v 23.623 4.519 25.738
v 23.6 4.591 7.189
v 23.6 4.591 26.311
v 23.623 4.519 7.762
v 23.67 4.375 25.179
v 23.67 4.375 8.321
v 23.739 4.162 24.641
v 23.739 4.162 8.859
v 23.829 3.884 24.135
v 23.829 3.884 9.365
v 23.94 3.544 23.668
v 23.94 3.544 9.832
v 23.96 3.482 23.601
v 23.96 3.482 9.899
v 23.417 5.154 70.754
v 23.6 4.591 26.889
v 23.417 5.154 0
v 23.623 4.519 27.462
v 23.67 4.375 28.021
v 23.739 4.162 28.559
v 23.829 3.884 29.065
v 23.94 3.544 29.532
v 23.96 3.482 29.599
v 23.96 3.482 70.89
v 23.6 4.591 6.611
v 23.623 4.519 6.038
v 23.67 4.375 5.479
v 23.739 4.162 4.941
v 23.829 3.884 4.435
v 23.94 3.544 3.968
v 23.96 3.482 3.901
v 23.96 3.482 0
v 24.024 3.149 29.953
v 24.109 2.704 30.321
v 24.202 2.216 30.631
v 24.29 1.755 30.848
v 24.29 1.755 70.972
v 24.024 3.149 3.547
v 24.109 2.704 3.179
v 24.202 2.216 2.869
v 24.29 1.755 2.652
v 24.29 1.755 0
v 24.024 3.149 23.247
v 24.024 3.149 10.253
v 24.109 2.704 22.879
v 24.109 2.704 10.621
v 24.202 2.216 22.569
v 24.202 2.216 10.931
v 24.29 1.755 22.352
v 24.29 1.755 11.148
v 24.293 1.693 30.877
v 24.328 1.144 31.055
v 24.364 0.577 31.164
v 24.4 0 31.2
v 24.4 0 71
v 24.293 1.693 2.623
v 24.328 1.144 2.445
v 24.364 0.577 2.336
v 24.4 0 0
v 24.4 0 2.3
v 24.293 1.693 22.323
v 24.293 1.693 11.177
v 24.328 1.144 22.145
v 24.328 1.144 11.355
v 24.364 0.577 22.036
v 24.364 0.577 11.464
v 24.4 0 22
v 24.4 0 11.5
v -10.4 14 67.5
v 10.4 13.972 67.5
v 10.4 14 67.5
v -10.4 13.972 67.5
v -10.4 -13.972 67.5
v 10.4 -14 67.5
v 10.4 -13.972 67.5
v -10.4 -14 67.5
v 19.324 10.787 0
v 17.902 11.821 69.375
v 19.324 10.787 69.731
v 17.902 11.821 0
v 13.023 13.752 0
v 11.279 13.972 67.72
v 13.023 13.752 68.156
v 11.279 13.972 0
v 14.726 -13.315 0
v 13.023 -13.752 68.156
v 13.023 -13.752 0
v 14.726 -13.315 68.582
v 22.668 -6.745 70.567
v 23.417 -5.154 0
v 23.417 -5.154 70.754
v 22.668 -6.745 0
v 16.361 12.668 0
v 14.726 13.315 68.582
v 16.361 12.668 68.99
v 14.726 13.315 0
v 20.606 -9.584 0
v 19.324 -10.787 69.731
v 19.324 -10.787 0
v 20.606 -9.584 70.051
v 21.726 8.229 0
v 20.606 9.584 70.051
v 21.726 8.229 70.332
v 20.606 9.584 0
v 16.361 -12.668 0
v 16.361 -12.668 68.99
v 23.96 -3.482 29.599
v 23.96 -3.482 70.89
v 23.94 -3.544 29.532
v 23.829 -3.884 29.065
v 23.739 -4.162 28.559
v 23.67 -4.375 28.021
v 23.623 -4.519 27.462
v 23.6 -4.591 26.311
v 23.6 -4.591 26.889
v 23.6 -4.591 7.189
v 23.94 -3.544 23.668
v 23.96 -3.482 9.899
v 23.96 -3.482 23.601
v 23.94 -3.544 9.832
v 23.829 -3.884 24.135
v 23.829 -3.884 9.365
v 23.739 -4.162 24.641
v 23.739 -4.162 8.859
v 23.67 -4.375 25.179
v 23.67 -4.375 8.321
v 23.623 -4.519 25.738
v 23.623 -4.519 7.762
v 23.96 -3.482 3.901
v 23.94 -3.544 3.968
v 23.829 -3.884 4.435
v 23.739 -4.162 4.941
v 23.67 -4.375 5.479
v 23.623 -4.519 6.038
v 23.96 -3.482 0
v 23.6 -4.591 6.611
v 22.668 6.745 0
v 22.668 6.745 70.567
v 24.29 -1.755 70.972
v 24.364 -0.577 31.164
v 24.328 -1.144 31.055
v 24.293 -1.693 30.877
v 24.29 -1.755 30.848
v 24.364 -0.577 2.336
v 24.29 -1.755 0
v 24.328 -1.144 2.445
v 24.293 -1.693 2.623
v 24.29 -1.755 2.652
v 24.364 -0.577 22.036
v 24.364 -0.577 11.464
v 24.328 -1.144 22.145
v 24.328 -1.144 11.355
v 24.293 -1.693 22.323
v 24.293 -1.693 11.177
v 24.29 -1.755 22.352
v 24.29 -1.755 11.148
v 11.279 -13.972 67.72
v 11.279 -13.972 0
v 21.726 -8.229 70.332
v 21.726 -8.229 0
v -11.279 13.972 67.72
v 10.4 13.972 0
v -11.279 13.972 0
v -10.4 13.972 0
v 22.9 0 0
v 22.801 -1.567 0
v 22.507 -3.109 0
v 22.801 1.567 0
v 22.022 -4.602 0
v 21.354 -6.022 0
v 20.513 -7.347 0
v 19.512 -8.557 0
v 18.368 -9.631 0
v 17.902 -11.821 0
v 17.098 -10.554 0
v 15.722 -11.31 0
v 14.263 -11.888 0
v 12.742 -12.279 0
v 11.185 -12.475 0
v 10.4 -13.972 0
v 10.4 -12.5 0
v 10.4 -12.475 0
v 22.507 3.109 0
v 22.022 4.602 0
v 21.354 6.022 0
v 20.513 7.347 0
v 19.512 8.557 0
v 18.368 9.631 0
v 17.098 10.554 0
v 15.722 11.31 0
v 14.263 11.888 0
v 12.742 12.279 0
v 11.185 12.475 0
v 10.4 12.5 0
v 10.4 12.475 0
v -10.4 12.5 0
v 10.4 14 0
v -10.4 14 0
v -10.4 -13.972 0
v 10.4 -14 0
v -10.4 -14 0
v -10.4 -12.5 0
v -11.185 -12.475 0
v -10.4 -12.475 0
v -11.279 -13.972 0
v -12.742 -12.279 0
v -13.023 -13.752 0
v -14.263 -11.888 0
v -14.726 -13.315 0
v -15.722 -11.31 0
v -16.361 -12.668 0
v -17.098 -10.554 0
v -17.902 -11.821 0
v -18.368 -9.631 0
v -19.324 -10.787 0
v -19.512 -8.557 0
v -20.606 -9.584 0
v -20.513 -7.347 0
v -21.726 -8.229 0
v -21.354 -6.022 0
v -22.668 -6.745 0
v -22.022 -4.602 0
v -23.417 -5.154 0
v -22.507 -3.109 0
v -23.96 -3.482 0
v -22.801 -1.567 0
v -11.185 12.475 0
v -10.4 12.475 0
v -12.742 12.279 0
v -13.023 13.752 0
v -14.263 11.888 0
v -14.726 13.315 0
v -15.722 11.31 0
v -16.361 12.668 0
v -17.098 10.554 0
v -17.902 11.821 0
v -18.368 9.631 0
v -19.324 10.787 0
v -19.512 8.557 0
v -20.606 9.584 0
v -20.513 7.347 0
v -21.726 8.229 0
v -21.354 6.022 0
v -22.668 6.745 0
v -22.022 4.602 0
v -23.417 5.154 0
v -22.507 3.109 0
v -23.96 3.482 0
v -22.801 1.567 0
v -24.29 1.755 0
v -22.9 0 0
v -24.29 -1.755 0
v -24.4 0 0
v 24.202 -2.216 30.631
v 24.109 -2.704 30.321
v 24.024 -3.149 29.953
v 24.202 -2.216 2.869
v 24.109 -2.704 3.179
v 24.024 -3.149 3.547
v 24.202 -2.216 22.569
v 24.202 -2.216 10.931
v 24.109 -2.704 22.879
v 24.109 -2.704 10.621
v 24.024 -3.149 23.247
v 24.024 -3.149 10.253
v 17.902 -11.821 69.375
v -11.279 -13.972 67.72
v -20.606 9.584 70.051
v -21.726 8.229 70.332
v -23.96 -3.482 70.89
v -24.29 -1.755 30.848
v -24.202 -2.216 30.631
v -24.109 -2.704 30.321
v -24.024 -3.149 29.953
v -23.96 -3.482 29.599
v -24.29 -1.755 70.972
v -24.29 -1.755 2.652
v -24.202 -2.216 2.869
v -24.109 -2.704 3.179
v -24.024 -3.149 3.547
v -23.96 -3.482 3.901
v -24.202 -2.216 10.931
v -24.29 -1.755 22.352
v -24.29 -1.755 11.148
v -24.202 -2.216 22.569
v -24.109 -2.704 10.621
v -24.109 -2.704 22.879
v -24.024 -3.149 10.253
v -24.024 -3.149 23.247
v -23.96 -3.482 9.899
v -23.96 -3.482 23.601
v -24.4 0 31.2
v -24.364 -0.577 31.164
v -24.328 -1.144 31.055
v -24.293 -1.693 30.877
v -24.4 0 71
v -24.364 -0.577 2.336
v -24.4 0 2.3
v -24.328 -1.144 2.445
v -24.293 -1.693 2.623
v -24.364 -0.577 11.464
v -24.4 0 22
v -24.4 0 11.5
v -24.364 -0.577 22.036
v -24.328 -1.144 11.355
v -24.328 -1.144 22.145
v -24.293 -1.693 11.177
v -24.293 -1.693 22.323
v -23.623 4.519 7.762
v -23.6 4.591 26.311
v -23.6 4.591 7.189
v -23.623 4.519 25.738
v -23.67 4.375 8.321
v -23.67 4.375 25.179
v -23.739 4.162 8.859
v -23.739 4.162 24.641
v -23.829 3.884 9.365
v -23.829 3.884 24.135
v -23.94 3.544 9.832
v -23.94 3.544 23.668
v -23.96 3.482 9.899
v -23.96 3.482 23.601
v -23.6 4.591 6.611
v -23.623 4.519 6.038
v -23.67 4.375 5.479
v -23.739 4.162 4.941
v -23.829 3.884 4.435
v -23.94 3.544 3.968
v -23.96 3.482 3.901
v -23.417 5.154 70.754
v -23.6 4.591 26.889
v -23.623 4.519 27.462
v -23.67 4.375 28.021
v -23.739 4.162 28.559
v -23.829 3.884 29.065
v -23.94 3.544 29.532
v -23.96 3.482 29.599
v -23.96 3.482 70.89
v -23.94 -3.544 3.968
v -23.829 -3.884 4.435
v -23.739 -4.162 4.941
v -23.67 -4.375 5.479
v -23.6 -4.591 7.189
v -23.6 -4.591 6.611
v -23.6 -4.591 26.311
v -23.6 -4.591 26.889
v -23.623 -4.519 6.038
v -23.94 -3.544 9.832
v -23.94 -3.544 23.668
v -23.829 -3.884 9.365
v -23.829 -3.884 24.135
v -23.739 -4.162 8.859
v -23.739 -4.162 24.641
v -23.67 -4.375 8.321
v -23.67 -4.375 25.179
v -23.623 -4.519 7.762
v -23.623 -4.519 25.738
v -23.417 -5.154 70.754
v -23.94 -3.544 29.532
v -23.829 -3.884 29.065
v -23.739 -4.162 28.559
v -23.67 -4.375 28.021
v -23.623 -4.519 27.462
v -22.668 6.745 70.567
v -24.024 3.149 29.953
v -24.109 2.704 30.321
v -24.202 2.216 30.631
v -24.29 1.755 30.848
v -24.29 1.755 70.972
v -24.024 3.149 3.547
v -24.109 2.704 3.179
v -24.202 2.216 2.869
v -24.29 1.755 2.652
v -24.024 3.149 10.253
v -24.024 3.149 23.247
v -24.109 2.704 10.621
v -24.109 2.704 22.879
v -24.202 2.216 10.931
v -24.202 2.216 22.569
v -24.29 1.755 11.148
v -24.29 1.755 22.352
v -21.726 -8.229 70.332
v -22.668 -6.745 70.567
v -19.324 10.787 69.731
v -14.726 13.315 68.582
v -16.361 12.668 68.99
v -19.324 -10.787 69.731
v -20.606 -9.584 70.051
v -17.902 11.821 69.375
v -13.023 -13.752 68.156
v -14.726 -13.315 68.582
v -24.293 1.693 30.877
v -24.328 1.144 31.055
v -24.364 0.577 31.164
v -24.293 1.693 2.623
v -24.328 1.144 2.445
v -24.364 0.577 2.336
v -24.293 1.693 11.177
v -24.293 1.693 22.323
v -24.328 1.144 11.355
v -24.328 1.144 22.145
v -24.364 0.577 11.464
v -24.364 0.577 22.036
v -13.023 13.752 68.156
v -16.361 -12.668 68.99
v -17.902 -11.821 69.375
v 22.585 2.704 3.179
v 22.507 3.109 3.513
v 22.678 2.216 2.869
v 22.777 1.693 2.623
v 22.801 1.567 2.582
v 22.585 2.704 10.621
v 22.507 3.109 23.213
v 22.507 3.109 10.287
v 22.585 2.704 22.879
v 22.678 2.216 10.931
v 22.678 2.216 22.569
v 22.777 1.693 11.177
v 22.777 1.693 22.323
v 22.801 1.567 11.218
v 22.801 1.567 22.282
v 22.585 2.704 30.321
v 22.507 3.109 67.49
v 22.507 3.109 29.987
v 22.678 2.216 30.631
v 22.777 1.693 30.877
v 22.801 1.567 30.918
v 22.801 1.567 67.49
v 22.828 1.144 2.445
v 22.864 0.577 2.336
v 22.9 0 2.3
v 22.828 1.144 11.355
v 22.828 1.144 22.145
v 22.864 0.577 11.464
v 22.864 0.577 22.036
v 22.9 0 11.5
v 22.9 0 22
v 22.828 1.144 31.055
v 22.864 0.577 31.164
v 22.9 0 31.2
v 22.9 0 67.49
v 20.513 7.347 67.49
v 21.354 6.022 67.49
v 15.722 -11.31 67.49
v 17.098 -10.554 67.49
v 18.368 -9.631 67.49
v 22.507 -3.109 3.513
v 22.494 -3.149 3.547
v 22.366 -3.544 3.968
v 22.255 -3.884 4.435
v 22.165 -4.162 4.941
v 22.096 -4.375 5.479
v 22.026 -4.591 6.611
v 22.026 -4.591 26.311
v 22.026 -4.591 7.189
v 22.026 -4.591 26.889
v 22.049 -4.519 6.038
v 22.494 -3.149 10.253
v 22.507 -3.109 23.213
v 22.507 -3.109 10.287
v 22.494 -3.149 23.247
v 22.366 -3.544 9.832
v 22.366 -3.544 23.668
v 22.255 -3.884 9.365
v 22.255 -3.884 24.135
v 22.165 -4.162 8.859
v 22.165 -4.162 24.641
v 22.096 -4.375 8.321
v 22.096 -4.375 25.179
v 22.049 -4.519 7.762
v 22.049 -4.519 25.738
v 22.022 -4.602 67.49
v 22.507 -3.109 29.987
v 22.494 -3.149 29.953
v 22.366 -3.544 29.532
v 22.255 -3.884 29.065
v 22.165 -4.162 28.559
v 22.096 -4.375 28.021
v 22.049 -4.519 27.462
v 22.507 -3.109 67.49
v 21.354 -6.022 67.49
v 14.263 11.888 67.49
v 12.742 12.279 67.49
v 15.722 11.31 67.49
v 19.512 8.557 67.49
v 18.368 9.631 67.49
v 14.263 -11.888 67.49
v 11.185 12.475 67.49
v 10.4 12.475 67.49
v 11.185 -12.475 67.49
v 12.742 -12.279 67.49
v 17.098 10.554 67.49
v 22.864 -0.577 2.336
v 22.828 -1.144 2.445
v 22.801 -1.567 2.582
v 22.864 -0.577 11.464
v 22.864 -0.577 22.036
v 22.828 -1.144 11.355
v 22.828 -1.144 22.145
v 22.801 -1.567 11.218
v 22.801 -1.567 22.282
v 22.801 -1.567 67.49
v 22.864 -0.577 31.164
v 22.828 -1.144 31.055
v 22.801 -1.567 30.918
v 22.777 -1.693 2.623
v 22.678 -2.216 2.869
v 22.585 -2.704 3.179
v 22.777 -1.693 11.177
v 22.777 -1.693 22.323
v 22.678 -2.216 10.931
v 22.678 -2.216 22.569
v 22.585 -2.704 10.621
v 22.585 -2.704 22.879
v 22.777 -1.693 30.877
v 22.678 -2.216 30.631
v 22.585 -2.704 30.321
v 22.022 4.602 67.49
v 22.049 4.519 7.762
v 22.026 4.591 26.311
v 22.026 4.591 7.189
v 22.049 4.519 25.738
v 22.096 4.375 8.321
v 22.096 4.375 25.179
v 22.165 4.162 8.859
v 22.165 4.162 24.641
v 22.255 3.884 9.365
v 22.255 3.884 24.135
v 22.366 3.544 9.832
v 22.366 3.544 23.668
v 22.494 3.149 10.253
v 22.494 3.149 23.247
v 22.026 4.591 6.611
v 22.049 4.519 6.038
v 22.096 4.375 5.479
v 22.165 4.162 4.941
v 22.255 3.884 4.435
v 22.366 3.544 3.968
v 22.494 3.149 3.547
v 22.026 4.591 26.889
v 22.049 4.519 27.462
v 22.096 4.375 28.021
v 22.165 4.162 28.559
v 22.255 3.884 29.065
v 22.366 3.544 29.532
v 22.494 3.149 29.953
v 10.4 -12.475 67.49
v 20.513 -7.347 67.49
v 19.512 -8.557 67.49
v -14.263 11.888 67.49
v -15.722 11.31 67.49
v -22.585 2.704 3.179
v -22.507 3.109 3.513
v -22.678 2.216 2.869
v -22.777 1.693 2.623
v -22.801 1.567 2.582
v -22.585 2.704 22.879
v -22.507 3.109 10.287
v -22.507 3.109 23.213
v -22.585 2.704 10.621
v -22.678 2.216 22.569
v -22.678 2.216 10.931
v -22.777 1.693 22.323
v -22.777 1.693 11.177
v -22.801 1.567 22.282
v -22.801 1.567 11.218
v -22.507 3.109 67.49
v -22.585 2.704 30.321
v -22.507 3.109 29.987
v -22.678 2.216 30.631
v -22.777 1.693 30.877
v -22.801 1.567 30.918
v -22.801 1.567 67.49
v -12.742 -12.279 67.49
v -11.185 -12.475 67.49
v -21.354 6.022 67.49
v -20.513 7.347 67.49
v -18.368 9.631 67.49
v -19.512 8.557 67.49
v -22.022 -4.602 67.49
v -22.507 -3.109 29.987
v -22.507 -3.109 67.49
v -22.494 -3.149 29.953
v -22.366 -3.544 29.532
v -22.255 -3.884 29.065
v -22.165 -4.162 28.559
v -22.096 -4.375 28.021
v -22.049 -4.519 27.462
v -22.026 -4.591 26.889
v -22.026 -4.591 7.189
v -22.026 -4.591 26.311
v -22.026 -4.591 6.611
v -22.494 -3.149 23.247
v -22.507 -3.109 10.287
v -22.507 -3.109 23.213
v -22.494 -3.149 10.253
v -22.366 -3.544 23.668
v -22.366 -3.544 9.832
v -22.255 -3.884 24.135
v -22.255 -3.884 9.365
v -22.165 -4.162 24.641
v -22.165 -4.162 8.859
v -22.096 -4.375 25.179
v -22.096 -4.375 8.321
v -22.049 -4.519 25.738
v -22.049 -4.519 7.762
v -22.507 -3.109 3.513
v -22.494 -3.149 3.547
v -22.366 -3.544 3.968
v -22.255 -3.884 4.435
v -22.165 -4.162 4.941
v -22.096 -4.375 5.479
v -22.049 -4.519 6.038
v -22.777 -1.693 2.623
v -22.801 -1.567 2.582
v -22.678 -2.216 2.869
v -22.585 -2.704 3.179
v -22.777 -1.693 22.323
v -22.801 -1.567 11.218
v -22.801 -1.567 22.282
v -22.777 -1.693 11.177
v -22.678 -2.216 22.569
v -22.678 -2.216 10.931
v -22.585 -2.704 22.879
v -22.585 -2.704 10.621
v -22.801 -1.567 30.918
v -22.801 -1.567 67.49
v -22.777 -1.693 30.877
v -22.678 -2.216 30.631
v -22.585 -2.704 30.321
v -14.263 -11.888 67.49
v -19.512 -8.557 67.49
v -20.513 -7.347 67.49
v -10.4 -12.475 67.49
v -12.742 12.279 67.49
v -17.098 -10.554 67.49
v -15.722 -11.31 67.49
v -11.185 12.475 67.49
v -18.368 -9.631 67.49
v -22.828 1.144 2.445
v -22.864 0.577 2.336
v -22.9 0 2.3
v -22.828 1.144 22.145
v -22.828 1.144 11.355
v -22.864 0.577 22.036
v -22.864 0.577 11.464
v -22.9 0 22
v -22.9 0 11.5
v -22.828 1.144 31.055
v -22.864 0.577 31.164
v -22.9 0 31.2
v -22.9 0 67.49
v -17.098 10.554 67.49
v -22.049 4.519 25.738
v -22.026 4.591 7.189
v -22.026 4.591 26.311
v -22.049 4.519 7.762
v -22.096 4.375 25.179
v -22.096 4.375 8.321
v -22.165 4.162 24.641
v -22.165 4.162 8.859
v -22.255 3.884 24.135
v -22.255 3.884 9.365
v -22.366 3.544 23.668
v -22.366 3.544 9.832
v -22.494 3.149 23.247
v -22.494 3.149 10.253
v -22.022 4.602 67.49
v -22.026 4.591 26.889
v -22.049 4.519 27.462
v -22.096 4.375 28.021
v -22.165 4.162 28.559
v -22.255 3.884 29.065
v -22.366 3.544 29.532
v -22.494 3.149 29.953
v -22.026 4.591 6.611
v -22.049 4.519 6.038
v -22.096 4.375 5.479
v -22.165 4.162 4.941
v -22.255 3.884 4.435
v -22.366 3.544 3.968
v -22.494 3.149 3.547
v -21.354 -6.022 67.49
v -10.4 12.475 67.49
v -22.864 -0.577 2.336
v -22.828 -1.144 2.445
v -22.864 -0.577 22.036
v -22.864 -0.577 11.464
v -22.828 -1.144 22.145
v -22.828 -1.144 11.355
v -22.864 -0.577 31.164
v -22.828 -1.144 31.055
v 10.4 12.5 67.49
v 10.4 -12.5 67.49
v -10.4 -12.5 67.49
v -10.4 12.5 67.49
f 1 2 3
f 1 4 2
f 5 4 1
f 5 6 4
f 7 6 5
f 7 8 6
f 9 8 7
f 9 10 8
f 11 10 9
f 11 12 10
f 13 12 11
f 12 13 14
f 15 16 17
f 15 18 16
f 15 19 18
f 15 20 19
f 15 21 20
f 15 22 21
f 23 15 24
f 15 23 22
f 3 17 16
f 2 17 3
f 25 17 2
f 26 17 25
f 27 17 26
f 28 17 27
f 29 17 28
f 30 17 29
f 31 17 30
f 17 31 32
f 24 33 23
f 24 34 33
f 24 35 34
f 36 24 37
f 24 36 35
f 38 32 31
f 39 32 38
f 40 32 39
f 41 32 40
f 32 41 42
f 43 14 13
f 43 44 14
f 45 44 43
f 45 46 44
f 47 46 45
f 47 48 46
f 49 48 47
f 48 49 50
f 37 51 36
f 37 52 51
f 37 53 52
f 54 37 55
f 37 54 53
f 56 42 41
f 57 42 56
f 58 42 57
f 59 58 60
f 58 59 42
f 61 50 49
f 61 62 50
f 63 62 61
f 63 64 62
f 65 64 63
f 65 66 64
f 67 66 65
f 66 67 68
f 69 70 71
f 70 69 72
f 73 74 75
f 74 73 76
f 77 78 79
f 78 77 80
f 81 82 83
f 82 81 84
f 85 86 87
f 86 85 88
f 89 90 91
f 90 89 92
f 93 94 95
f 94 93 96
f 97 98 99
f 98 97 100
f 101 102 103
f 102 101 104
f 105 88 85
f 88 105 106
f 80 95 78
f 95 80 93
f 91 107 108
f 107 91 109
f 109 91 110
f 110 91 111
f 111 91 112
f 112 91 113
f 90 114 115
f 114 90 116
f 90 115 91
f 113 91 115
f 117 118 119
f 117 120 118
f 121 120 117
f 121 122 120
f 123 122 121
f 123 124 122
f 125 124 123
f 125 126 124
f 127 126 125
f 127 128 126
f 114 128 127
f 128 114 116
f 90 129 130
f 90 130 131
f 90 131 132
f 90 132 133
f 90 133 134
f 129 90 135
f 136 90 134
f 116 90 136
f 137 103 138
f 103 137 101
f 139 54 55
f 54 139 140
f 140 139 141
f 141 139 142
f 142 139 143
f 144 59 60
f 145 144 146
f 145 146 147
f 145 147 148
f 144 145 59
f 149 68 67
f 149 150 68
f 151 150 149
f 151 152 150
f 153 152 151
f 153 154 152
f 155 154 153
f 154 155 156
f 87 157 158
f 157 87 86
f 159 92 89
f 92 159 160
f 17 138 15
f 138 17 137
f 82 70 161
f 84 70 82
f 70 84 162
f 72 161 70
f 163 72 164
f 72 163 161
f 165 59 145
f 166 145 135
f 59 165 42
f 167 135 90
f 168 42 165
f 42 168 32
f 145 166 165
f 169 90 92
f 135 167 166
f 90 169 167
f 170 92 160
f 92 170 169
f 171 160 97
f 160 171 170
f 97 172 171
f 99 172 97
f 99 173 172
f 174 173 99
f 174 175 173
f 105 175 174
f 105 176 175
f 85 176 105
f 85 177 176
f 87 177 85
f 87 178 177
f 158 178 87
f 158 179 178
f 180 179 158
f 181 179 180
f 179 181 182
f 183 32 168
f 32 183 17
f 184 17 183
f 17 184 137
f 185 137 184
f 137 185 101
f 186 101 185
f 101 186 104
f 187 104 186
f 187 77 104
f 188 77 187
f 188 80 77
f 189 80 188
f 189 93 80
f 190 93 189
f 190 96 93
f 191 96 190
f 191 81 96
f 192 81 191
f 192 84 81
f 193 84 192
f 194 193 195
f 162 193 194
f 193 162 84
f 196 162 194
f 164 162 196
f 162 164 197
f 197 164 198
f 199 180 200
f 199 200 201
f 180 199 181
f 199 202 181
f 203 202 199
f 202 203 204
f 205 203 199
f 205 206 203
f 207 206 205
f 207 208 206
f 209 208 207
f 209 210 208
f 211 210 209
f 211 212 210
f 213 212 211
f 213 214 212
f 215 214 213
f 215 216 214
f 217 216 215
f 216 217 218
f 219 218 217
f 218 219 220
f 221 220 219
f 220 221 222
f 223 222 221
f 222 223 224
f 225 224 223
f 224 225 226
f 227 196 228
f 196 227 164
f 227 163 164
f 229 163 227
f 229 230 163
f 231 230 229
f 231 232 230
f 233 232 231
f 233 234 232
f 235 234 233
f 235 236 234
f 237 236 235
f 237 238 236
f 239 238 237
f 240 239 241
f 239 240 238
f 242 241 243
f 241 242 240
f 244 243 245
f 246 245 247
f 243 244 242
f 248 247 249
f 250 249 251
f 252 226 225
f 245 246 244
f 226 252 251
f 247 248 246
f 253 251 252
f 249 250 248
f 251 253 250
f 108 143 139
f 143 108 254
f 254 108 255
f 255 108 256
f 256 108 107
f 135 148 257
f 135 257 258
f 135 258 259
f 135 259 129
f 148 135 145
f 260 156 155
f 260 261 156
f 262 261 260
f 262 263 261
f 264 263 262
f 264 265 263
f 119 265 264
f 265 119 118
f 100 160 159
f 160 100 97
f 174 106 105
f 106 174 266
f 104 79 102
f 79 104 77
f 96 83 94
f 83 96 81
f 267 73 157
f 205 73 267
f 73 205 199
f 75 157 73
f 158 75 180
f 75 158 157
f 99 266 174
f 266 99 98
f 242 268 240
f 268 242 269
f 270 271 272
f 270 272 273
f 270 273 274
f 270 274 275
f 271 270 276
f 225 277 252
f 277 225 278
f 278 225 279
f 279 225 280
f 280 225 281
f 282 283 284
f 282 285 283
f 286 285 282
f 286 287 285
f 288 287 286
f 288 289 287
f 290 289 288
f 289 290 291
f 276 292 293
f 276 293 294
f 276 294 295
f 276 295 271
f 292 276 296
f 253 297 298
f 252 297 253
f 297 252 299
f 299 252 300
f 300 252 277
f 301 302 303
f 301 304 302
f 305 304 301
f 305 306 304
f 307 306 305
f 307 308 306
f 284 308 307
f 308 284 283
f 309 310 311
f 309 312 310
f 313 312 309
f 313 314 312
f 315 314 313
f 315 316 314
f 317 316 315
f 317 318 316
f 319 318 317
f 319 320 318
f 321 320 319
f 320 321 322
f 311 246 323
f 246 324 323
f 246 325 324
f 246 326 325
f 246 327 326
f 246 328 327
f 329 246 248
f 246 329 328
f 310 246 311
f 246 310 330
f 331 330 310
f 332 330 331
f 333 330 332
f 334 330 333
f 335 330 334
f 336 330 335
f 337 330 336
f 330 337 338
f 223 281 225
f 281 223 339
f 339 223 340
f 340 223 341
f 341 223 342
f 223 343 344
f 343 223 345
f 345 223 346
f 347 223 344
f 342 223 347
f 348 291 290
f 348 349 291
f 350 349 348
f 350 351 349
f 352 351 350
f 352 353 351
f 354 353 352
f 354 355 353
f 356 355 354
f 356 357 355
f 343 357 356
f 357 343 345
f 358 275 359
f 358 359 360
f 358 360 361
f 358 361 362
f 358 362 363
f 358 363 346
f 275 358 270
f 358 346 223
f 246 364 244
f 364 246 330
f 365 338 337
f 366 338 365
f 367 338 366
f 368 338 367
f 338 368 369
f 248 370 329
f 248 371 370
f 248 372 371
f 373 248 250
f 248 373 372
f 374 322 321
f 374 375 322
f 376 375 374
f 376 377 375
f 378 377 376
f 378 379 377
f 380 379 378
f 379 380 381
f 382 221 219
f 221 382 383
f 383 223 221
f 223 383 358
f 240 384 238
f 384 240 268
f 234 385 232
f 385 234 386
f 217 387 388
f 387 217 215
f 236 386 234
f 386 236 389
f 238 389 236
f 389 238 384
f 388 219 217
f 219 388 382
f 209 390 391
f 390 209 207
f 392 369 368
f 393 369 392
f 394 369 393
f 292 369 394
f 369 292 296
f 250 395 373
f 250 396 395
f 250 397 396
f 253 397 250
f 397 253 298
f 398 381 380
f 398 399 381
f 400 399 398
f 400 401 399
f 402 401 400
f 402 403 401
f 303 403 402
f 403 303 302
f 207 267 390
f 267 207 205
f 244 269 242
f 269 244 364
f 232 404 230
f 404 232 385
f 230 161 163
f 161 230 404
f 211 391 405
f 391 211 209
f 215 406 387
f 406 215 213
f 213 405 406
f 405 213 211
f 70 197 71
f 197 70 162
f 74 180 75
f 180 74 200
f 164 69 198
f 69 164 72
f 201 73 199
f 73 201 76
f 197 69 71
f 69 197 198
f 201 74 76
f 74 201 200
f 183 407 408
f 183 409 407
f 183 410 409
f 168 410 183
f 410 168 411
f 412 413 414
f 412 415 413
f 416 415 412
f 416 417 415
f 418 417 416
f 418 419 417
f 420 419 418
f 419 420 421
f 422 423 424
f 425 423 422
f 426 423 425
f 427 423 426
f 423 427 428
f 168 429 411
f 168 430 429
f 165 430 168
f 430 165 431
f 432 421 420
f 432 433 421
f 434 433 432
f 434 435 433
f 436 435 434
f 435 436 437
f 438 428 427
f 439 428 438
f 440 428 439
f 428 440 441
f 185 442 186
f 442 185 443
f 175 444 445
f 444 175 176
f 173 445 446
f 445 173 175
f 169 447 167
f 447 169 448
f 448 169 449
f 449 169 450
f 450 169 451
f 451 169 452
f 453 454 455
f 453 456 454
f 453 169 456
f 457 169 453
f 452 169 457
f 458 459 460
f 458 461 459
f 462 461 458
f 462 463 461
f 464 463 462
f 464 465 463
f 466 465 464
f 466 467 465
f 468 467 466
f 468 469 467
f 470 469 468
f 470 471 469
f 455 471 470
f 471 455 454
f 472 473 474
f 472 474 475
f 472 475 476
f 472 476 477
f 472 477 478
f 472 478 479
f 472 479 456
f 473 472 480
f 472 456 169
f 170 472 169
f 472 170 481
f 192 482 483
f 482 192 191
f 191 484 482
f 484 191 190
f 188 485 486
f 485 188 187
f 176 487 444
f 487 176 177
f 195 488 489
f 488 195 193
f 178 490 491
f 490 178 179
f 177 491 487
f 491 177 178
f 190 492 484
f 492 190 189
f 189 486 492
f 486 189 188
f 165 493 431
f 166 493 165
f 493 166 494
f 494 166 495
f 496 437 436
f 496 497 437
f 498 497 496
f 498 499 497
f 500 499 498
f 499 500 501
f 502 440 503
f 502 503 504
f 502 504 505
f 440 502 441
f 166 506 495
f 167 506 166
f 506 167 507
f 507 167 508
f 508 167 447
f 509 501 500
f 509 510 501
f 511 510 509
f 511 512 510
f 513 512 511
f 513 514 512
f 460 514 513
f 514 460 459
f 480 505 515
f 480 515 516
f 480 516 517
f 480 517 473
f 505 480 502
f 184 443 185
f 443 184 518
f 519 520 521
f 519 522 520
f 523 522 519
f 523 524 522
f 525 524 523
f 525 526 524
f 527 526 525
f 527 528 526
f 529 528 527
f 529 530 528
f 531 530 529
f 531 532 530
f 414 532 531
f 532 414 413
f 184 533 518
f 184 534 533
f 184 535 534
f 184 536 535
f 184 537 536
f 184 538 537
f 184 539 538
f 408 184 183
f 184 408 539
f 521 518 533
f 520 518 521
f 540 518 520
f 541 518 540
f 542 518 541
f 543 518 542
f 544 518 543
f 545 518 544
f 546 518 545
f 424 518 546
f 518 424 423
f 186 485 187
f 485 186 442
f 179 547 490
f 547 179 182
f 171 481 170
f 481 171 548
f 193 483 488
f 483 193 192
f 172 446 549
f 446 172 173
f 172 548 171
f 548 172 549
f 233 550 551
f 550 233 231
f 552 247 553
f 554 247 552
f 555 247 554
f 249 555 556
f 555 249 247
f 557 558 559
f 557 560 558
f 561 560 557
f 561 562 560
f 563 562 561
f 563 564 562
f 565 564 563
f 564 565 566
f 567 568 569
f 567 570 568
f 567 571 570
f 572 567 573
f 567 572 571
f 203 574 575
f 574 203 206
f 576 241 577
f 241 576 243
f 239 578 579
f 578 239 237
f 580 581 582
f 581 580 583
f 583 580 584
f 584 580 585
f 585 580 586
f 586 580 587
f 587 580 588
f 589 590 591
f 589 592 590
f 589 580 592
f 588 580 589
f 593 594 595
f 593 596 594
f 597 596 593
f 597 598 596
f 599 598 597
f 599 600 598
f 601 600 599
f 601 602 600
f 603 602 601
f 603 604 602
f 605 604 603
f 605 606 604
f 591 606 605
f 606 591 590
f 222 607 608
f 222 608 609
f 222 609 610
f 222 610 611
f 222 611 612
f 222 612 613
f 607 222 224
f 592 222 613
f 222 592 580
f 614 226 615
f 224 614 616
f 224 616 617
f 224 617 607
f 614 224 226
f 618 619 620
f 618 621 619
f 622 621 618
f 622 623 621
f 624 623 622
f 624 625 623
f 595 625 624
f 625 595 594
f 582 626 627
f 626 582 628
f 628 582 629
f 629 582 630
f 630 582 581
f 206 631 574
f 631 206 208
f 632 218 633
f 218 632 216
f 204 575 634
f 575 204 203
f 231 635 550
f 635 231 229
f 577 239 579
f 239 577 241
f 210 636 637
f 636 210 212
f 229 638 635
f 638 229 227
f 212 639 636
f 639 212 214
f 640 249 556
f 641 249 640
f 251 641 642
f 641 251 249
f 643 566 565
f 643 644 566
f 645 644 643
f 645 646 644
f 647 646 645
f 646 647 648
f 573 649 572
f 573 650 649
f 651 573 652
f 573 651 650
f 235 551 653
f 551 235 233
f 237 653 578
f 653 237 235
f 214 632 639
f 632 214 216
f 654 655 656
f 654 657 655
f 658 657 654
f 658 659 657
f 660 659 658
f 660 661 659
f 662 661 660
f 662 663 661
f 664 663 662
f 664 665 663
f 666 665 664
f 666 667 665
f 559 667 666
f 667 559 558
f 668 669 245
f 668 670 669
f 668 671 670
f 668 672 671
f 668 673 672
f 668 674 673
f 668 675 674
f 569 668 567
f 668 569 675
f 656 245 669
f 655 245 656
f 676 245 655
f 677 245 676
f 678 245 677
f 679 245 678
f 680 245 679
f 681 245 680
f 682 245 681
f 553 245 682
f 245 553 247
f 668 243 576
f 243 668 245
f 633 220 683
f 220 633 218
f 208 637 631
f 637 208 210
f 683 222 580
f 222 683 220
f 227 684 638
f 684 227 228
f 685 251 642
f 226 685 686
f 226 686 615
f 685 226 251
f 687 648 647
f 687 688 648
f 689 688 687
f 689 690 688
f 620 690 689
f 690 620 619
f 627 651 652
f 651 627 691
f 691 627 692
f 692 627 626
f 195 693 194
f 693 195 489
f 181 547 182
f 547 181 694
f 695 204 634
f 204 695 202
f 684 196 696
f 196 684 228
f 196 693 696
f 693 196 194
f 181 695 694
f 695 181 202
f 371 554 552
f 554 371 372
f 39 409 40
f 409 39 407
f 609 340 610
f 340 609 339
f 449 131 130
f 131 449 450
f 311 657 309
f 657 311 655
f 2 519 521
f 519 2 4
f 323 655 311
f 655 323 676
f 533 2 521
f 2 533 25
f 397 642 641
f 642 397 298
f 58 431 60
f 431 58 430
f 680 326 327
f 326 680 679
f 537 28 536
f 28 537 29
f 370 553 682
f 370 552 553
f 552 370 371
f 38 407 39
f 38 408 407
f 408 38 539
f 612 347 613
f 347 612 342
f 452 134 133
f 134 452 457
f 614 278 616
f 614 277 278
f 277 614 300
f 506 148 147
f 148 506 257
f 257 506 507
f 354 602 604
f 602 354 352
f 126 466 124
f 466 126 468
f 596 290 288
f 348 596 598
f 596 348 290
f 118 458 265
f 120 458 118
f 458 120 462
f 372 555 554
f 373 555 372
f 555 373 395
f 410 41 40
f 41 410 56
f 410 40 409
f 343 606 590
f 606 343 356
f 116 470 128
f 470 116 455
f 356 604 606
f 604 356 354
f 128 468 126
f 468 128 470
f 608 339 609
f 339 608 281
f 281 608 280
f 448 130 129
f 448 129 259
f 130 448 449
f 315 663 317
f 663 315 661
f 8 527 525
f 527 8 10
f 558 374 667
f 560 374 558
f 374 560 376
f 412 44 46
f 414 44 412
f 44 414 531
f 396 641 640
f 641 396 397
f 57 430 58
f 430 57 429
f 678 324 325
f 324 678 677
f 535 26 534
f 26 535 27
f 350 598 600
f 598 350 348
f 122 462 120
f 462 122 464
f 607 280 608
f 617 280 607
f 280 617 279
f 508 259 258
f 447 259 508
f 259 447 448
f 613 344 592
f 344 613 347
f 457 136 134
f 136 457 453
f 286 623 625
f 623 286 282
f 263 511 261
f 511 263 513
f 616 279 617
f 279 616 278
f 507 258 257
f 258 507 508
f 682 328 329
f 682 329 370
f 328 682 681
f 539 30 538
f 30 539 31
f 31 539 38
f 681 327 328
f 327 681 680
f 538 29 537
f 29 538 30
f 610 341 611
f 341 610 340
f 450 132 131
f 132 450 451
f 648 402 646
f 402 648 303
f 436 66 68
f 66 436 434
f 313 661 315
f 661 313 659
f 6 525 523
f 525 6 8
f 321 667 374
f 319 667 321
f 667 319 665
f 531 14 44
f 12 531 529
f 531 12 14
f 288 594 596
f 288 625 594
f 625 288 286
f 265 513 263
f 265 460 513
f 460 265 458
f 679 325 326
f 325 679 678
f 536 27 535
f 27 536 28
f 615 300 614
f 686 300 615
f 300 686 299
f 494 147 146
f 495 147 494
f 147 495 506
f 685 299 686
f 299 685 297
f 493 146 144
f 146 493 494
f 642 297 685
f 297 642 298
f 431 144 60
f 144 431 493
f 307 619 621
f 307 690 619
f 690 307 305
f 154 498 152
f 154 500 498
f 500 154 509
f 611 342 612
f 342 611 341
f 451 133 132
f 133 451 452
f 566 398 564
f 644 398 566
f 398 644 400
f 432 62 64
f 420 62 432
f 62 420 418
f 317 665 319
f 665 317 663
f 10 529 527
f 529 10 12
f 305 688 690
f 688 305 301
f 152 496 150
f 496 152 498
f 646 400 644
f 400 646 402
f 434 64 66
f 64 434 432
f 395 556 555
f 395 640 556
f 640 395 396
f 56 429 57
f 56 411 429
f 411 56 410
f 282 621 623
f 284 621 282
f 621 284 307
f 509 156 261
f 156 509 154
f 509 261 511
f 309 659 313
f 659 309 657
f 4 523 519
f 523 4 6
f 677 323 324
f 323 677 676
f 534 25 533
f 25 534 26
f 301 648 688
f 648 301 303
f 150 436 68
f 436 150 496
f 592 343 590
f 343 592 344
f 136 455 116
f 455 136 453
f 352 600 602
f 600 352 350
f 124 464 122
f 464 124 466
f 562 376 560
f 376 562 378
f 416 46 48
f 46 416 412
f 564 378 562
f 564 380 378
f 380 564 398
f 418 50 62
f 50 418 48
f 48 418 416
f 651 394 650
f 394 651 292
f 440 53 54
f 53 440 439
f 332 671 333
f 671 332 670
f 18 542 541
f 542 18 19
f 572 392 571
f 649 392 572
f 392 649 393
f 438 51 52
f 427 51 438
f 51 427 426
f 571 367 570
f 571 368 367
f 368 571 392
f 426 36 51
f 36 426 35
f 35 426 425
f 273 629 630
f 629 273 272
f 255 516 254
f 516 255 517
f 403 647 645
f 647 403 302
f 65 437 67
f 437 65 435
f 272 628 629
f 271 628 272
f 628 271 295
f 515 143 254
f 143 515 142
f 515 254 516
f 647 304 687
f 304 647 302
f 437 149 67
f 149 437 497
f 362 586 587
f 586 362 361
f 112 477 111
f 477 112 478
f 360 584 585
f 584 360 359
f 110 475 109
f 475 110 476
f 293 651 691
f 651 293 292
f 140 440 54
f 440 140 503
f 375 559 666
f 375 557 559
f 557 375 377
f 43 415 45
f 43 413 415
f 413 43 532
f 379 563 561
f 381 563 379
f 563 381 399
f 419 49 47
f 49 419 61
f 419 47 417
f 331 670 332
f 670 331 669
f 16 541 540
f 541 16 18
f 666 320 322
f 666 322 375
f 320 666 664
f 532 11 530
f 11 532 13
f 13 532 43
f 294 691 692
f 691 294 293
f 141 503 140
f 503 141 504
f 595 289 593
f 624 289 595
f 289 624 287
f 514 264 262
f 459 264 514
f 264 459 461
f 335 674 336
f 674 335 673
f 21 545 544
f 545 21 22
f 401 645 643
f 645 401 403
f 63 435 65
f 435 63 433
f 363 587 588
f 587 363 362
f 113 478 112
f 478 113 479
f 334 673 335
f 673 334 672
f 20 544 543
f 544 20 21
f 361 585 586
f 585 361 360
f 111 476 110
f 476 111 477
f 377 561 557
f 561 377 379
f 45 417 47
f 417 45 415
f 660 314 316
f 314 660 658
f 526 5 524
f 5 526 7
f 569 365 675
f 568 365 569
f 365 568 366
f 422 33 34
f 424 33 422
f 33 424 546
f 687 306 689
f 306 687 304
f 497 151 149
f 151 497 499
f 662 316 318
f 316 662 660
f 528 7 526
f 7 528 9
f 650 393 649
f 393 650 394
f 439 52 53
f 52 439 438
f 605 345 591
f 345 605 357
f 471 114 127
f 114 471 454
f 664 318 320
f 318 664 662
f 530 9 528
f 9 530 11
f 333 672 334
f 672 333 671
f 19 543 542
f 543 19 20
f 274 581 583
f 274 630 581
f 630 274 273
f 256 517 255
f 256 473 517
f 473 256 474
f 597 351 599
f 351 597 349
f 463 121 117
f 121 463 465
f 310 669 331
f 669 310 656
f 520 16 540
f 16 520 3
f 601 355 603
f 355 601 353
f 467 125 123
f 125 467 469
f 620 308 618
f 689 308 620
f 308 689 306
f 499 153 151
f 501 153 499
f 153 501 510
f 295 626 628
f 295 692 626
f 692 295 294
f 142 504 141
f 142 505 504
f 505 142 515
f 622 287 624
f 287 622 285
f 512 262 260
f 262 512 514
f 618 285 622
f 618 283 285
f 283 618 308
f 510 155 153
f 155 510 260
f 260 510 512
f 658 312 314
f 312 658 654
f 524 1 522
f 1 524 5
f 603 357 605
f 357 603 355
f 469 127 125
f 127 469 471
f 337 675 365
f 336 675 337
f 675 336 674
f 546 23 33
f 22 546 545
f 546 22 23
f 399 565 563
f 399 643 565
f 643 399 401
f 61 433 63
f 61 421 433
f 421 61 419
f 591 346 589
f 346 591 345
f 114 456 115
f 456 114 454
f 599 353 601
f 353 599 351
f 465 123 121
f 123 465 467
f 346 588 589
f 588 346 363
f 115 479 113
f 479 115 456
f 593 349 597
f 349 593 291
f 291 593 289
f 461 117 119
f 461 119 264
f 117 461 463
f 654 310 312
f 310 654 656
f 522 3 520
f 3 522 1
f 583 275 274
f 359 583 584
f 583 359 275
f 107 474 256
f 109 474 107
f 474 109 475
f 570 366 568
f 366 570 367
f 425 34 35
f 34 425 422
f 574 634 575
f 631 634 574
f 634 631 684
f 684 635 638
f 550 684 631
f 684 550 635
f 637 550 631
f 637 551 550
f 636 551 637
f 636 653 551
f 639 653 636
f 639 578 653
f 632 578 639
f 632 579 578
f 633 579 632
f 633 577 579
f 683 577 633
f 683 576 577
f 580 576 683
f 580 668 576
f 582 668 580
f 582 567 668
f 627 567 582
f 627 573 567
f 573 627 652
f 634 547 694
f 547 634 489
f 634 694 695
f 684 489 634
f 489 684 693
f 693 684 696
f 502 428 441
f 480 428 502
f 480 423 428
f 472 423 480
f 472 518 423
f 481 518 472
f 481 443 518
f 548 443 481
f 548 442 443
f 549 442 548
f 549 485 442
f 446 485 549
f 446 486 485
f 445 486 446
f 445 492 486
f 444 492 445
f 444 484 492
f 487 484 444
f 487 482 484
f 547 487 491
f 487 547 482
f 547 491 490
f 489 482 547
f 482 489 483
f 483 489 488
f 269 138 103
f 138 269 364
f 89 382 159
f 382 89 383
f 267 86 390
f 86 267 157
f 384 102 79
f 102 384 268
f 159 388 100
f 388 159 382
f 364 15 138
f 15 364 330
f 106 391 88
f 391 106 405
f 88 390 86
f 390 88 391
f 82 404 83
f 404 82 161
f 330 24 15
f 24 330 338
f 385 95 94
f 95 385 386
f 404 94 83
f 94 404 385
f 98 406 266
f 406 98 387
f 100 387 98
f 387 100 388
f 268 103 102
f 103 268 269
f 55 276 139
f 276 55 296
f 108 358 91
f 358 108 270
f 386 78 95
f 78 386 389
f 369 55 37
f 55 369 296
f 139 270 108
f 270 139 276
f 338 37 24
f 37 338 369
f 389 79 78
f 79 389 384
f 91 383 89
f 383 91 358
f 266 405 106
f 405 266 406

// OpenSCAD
length=48.8;
width=28;
height=71;
breadth=1.5;
rounding_top=3.5;
hole1_position=2.3;
hole_distance=10.5;
hole_diameter=9.2;

$fn=50;

sheight=height-rounding_top;
module outer() {
    translate([(length-width)/2,0,0]) cylinder(h=sheight, d=width);
    translate([-(length-width)/2,0,0]) cylinder(h=sheight, d=width);
    translate([-(length-width)/2,-width/2,0]) cube([length-width,width,sheight]);
}

module inner() {
    translate([(length-width)/2,0,-0.01]) cylinder(h=sheight+0.02, d=width-2*breadth);
    translate([-(length-width)/2,0,-0.01]) cylinder(h=sheight+0.02, d=width-2*breadth);
    translate([-(length-width)/2,-width/2+breadth,-0.01]) cube([length-width,width-2*breadth,sheight+0.02]);
}

difference() {
    outer();
    inner();
    translate([0,0,hole1_position+hole_diameter/2]) rotate([0,90,0]) cylinder(h=length+0.02, d=hole_diameter,center=true);
    translate([0,0,hole1_position+hole_diameter*1.5+hole_distance]) rotate([0,90,0]) cylinder(h=length+0.02, d=hole_diameter,center=true);
}

intersection() {
    translate([0,0,sheight]) rotate([0,90,0]) scale([rounding_top*2/width,1,1]) cylinder(h=length+0.02, d=width,center=true);
    difference() {
        translate([0,0,rounding_top+0.01]) outer();
        translate([-length/2-0.01,-width/2-0.01,0]) cube([length+0.02,width+0.02,height-rounding_top-0.01]);
    }
}
